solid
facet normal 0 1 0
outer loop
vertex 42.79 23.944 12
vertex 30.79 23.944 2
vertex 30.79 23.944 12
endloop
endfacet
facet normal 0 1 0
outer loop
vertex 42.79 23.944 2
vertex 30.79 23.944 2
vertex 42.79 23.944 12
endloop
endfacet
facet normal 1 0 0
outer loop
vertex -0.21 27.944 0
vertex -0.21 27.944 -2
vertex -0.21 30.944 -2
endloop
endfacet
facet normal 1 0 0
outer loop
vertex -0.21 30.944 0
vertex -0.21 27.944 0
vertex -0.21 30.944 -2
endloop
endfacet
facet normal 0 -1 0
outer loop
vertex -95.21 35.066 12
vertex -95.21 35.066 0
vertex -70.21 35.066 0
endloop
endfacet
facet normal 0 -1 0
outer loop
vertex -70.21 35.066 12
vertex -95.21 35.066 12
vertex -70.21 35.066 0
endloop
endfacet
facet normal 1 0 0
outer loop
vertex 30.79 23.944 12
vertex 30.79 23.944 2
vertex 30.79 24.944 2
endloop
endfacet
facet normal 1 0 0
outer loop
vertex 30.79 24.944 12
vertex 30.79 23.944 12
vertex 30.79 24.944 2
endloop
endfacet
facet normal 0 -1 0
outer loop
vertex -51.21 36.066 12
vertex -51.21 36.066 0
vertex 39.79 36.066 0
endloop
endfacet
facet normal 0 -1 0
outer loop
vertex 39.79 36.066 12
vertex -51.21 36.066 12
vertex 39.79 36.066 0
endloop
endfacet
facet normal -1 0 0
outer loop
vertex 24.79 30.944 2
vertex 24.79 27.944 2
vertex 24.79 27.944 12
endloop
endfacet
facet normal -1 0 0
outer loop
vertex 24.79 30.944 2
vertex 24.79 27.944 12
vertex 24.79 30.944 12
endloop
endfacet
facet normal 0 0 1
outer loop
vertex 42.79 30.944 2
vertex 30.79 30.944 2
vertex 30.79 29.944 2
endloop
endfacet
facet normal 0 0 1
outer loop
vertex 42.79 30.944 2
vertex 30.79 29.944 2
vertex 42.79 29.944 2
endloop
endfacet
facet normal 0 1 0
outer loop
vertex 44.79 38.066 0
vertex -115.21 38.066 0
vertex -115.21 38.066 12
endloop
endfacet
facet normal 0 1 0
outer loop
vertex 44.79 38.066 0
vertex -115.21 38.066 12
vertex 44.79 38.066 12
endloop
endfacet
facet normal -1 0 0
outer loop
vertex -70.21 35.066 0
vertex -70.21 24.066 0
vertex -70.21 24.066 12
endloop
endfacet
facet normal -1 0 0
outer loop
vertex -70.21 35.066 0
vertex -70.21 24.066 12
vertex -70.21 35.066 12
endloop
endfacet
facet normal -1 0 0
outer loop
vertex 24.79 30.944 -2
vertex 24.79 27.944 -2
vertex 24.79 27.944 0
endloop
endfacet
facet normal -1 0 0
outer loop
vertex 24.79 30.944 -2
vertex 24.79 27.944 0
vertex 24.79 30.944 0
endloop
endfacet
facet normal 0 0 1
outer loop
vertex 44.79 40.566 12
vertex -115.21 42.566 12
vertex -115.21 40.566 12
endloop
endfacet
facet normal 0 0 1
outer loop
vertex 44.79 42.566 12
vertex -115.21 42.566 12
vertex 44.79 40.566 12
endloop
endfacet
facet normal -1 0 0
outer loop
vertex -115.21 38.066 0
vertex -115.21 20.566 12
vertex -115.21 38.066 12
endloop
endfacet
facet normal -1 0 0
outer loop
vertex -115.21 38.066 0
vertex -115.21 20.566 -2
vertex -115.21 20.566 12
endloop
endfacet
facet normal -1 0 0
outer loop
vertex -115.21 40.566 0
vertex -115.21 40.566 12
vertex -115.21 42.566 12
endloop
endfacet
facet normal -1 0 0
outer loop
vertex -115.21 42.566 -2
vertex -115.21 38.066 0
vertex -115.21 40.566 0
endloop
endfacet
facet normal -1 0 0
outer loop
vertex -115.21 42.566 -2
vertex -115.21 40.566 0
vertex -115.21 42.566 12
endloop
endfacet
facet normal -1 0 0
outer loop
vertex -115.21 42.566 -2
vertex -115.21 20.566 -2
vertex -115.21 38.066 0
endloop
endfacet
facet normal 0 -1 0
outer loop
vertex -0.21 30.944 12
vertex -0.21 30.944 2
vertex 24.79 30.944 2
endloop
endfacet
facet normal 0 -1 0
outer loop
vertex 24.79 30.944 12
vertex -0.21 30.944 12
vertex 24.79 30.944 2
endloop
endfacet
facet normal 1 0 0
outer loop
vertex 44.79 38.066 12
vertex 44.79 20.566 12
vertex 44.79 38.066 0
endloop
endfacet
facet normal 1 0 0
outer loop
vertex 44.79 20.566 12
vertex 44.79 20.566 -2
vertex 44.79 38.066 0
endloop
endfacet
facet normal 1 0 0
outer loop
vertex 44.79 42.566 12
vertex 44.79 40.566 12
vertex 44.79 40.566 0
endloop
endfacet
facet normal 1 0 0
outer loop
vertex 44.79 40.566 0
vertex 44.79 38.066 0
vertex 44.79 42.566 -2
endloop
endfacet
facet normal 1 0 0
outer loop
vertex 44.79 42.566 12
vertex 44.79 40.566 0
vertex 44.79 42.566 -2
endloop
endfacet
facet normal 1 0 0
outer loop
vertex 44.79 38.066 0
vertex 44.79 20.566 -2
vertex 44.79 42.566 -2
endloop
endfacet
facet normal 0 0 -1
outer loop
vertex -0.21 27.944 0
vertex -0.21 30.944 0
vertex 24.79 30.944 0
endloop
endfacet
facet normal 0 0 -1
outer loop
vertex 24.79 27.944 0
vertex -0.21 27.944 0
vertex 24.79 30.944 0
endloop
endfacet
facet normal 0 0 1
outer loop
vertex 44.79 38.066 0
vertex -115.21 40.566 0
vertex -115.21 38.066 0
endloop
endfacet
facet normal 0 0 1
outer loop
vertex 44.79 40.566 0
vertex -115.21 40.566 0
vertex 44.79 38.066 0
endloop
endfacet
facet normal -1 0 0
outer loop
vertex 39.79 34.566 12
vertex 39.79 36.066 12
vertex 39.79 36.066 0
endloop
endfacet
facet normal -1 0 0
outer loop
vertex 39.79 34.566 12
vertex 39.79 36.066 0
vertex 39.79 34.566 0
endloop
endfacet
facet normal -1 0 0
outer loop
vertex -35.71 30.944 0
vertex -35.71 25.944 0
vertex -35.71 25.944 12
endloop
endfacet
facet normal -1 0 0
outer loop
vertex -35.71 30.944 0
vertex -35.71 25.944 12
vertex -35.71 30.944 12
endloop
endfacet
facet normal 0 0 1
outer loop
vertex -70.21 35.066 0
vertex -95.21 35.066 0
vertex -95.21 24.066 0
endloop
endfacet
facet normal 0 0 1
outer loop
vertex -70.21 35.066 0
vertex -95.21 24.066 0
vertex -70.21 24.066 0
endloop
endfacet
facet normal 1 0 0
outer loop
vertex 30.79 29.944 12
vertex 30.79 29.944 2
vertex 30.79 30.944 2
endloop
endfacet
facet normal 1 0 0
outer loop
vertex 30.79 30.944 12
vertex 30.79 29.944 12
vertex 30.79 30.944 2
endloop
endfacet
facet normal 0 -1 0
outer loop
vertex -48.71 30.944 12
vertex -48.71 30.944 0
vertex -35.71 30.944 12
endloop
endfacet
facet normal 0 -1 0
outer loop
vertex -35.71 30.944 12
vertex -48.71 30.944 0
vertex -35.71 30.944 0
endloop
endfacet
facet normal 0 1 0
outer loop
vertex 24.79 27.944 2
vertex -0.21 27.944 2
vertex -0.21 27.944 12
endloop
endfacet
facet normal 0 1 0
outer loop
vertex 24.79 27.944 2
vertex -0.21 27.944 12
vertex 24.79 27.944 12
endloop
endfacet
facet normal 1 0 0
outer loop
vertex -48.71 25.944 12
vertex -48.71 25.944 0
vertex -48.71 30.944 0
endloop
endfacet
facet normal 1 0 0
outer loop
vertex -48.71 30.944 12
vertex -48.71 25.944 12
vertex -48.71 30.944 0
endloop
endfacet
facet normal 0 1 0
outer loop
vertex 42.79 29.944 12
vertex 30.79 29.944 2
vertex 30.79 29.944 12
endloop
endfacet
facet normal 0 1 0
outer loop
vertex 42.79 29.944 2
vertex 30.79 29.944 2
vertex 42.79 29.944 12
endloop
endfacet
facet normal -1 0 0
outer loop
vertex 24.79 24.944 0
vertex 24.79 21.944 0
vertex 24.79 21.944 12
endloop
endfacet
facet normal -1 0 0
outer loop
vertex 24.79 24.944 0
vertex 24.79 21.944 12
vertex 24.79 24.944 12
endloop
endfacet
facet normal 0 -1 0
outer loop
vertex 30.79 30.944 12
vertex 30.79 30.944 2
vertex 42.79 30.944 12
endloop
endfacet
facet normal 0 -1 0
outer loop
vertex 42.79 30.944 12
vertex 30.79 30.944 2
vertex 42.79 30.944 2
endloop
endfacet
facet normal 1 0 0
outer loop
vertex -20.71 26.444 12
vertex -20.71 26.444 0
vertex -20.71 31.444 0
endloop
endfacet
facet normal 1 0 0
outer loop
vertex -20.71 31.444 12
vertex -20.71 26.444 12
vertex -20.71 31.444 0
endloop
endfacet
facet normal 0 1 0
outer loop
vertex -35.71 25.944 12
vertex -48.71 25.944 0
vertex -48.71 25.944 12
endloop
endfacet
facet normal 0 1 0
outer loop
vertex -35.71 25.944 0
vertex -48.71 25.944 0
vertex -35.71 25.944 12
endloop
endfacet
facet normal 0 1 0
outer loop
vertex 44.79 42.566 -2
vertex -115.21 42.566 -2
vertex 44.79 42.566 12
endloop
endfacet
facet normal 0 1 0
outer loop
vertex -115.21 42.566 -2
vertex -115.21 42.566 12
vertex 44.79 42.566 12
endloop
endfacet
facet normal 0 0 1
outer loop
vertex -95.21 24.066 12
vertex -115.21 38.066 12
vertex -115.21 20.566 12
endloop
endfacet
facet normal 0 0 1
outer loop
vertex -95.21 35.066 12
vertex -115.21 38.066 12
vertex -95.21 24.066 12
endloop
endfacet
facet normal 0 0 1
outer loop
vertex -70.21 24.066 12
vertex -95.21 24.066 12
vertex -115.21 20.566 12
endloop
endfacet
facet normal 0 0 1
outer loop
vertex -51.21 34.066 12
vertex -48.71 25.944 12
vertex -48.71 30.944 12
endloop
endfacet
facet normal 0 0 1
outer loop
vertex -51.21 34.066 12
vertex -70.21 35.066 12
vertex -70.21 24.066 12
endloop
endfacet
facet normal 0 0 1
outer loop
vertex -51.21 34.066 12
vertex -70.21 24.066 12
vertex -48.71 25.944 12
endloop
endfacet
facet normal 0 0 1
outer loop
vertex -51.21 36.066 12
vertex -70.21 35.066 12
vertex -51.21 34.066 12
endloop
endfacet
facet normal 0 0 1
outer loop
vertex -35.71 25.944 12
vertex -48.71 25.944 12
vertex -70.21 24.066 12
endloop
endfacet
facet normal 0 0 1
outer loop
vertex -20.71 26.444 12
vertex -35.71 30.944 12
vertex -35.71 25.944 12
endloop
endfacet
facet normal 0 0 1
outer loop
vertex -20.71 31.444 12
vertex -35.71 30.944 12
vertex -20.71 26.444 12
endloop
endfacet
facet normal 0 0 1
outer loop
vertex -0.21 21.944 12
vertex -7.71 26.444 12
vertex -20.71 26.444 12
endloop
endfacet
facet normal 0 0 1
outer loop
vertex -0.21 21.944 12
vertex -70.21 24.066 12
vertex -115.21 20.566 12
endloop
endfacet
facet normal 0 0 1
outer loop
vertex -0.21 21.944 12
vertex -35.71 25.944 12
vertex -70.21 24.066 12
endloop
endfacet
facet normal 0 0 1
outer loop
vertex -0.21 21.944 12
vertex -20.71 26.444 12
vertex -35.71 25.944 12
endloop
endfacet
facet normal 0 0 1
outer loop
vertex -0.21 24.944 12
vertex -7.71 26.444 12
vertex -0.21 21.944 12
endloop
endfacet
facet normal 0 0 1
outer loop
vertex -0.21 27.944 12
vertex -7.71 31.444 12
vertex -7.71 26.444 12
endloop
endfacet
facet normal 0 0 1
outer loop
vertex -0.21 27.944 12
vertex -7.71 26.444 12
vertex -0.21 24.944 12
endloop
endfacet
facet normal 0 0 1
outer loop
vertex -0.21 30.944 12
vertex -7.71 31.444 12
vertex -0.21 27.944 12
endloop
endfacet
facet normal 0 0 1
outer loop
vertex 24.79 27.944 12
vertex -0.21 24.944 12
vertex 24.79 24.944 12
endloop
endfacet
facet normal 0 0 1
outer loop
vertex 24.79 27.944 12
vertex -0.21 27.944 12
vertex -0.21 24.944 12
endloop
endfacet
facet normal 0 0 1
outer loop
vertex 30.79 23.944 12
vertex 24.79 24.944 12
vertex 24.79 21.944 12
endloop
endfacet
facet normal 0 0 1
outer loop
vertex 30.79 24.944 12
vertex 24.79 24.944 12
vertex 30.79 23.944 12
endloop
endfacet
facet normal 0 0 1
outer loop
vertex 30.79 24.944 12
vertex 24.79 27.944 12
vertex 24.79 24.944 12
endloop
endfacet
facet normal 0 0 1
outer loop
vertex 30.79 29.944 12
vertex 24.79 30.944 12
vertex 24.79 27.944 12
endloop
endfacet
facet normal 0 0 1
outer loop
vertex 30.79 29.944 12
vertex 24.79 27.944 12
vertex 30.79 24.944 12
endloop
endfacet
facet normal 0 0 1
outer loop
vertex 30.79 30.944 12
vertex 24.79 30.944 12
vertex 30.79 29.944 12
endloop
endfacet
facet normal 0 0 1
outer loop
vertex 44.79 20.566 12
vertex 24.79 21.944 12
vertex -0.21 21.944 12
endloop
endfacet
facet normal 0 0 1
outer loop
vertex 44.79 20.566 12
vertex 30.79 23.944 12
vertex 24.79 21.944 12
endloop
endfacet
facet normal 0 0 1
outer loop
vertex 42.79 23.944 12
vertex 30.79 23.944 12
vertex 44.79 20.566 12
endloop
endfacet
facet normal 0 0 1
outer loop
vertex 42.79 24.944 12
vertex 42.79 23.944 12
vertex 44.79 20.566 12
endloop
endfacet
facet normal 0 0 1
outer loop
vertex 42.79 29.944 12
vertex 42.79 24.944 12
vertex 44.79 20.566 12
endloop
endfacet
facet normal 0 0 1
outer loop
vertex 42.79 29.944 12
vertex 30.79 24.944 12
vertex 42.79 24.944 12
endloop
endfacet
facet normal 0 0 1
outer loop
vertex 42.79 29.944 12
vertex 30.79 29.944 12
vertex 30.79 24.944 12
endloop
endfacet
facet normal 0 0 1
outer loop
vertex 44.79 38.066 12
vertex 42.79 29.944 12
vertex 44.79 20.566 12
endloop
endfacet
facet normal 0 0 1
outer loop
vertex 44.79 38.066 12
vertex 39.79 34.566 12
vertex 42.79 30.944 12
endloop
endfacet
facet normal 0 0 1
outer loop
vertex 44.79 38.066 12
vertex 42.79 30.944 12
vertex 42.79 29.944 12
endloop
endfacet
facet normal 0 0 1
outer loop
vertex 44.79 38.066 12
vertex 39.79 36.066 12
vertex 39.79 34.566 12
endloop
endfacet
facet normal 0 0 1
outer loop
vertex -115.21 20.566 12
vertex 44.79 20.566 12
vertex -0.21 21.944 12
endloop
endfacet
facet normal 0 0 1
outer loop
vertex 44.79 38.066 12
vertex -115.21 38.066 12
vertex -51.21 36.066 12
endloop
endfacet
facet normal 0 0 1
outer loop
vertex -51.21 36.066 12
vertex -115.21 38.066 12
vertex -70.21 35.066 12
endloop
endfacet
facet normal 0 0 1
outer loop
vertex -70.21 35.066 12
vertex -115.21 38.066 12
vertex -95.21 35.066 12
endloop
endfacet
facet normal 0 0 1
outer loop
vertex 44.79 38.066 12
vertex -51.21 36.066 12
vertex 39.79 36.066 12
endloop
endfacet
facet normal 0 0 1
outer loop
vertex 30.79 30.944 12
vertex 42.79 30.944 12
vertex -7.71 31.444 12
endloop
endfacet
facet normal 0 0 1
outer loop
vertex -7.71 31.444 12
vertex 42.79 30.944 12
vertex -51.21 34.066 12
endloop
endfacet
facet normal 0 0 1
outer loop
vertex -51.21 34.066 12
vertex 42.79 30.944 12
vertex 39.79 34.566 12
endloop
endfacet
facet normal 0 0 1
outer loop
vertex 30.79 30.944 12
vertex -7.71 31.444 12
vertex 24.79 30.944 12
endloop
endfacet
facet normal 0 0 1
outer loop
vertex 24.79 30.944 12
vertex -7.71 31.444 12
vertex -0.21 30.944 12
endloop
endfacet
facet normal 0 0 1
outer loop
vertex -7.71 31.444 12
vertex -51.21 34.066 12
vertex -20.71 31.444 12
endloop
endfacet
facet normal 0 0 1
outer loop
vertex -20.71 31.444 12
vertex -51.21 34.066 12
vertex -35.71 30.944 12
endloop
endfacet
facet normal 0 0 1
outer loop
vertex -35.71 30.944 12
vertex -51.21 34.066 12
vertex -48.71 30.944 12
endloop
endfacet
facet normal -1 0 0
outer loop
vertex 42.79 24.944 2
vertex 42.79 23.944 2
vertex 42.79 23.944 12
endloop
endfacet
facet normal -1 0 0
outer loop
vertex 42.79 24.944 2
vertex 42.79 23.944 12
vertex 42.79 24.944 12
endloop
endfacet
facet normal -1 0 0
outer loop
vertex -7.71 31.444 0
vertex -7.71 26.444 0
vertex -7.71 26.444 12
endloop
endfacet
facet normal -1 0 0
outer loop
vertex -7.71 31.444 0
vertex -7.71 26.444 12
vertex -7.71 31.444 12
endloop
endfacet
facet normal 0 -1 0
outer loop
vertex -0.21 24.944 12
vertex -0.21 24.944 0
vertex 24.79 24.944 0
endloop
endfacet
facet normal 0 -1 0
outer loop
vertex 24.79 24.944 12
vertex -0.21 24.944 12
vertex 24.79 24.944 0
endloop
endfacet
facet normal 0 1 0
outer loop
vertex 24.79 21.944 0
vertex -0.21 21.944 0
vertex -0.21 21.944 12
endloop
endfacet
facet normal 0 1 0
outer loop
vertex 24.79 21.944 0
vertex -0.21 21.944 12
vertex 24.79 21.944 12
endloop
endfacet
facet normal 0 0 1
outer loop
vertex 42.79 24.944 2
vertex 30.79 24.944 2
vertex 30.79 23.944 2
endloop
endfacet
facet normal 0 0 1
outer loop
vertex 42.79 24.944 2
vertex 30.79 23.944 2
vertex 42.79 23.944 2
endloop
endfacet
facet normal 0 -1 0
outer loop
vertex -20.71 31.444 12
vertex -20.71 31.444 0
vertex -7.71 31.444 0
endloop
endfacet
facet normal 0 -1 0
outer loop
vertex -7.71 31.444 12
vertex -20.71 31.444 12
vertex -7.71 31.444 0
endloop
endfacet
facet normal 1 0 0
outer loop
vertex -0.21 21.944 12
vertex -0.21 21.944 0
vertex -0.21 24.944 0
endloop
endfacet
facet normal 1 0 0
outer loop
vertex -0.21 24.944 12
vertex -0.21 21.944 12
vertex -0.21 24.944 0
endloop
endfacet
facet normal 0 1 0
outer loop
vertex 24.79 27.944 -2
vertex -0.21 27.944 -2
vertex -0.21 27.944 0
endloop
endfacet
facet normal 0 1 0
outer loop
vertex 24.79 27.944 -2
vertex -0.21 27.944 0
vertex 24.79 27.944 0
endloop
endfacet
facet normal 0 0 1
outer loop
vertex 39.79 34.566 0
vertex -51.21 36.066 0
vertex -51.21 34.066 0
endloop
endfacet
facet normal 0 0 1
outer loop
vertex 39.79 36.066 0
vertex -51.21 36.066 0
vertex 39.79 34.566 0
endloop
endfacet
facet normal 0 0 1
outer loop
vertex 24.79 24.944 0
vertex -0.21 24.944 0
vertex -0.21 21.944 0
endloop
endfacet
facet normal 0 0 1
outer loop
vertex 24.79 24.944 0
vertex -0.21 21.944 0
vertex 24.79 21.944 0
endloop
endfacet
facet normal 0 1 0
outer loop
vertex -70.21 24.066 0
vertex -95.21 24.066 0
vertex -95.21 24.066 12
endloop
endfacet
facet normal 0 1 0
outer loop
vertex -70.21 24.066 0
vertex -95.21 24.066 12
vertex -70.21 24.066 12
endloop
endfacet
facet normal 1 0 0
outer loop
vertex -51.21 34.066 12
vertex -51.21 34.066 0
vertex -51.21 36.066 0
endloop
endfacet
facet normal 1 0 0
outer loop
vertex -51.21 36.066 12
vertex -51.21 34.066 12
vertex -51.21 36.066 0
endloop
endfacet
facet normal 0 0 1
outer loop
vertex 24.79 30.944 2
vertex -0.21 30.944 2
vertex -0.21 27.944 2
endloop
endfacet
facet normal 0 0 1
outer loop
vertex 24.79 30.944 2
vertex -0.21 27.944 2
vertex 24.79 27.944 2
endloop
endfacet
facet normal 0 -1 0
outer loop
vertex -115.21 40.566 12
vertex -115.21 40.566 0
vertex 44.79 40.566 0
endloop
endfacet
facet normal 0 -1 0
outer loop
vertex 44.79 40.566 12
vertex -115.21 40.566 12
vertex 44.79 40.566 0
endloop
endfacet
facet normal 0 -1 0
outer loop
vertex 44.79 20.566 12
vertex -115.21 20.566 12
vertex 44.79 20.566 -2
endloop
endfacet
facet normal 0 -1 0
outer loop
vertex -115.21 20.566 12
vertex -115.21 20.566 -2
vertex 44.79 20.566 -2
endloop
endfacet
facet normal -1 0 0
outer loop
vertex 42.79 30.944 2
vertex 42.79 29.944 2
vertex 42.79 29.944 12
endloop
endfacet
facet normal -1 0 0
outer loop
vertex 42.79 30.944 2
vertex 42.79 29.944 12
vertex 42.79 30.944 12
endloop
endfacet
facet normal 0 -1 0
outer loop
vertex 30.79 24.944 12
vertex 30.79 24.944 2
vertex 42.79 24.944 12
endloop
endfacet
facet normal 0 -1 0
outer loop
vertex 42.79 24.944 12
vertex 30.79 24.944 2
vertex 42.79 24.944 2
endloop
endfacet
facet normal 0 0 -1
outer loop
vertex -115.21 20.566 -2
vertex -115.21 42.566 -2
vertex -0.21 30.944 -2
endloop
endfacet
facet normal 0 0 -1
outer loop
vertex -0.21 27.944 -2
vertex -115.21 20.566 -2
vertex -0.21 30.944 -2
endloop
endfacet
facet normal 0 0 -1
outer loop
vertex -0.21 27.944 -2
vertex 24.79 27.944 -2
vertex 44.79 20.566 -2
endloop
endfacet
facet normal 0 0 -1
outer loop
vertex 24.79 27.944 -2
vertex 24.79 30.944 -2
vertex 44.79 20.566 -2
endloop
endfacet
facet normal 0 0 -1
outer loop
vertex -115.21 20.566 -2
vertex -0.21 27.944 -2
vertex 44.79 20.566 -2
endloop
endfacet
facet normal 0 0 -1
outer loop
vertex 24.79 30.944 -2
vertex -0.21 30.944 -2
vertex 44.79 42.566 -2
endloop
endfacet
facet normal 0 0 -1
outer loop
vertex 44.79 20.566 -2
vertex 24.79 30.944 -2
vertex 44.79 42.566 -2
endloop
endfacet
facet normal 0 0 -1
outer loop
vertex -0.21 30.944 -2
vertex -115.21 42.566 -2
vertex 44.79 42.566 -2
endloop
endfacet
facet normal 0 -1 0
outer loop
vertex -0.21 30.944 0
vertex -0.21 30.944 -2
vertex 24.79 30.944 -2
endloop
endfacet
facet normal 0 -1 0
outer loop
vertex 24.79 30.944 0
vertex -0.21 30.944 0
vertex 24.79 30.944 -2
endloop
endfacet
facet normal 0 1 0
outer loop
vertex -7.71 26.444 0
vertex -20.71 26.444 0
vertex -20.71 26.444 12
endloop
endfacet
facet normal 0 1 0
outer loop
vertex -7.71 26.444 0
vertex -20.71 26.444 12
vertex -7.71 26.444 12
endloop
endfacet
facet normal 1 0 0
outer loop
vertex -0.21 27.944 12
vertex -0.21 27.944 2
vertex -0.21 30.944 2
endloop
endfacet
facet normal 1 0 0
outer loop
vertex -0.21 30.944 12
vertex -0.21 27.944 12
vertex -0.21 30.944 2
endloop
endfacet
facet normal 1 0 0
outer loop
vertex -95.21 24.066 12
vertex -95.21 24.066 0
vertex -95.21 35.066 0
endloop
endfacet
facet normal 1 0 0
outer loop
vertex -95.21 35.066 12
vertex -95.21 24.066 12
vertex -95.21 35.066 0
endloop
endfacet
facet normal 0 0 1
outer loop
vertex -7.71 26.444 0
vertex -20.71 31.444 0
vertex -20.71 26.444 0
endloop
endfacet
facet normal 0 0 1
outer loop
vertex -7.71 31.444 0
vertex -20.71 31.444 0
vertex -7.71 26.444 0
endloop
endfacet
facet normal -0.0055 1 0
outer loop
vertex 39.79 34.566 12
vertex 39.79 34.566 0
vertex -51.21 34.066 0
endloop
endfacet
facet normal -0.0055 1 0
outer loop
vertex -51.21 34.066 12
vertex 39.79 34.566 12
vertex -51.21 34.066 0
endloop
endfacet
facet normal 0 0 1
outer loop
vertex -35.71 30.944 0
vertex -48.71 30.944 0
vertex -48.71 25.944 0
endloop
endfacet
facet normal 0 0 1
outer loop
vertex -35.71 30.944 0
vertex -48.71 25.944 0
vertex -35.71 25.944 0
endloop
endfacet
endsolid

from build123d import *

# Parameters (mm, degrees)
F0_W     = 160
F0_H     = 17.5
F0_W_2   = 25
F0_H_2   = 11
F0_W_3   = 13
F0_H_3   = 5
F0_H_4   = 3
F0_W_4   = 12
F0_H_5   = 1
F0_H_6   = 2.5
F0_H_7   = 2
F1_DEPTH = 2
F2_DEPTH = 12
F3_DEPTH = 2
F4_DEPTH = 2


# Not quite as in the source:
# - a feature names something its author has since deleted; it is built from what else it names


with BuildPart() as f1:
    # F0 (on Top) → F1 (new body)
    with BuildSketch(Plane.XY):
        with Locations((-35.2099549949, 29.3164705649)):
            Rectangle(F0_W, F0_H)
        with Locations((-82.7099549949, 29.5664705649)):
            Rectangle(F0_W_2, F0_H_2, mode=Mode.SUBTRACT)
        with Locations((-42.2099549949, 28.443671599)):
            Rectangle(F0_W_3, F0_H_3, mode=Mode.SUBTRACT)
        with Locations((12.2900450051, 23.443671599)):
            Rectangle(F0_W_2, F0_H_4, mode=Mode.SUBTRACT)
        with Locations((36.7900450051, 24.443671599)):
            Rectangle(F0_W_4, F0_H_5, mode=Mode.SUBTRACT)
        with Locations((-14.2099549949, 28.943671599)):
            Rectangle(F0_W_3, F0_H_3, mode=Mode.SUBTRACT)
        with Locations((12.2900450051, 29.443671599)):
            Rectangle(F0_W_2, F0_H_4, mode=Mode.SUBTRACT)
        with Locations((36.7900450051, 30.443671599)):
            Rectangle(F0_W_4, F0_H_5, mode=Mode.SUBTRACT)
        Polygon((-51.2099549949, 36.0664705649), (39.7900450051, 36.0664705649), (39.7900450051, 34.5664705649), (-51.2099549949, 34.0664705649), align=None, mode=Mode.SUBTRACT)
        with Locations((-35.2099549949, 39.3164705649)):
            Rectangle(F0_W, F0_H_6)
        with Locations((-35.2099549949, 41.5664705649)):
            Rectangle(F0_W, F0_H_7)
        with Locations((-82.7099549949, 29.5664705649)):
            Rectangle(F0_W_2, F0_H_2)
        Polygon((39.7900450051, 34.5664705649), (39.7900450051, 36.0664705649), (-51.2099549949, 36.0664705649), (-51.2099549949, 34.0664705649), align=None)
        with Locations((12.2900450051, 23.443671599)):
            Rectangle(F0_W_2, F0_H_4)
        with Locations((-42.2099549949, 28.443671599)):
            Rectangle(F0_W_3, F0_H_3)
        with Locations((-14.2099549949, 28.943671599)):
            Rectangle(F0_W_3, F0_H_3)
        with Locations((36.7900450051, 24.443671599)):
            Rectangle(F0_W_4, F0_H_5)
        with Locations((36.7900450051, 30.443671599)):
            Rectangle(F0_W_4, F0_H_5)
    extrude(amount=-F1_DEPTH)

    # F0 (on Top) → F2 (join)
    with BuildSketch(Plane.XY):
        with Locations((-35.2099549949, 29.3164705649)):
            Rectangle(F0_W, F0_H)
        with Locations((-82.7099549949, 29.5664705649)):
            Rectangle(F0_W_2, F0_H_2, mode=Mode.SUBTRACT)
        with Locations((-42.2099549949, 28.443671599)):
            Rectangle(F0_W_3, F0_H_3, mode=Mode.SUBTRACT)
        with Locations((12.2900450051, 23.443671599)):
            Rectangle(F0_W_2, F0_H_4, mode=Mode.SUBTRACT)
        with Locations((36.7900450051, 24.443671599)):
            Rectangle(F0_W_4, F0_H_5, mode=Mode.SUBTRACT)
        with Locations((-14.2099549949, 28.943671599)):
            Rectangle(F0_W_3, F0_H_3, mode=Mode.SUBTRACT)
        with Locations((12.2900450051, 29.443671599)):
            Rectangle(F0_W_2, F0_H_4, mode=Mode.SUBTRACT)
        with Locations((36.7900450051, 30.443671599)):
            Rectangle(F0_W_4, F0_H_5, mode=Mode.SUBTRACT)
        Polygon((-51.2099549949, 36.0664705649), (39.7900450051, 36.0664705649), (39.7900450051, 34.5664705649), (-51.2099549949, 34.0664705649), align=None, mode=Mode.SUBTRACT)
        with Locations((-35.2099549949, 41.5664705649)):
            Rectangle(F0_W, F0_H_7)
    extrude(amount=F2_DEPTH)

    # F0 (on Top) → F3 (join)
    with BuildSketch(Plane.XY):
        with Locations((36.7900450051, 30.443671599)):
            Rectangle(F0_W_4, F0_H_5)
        with Locations((36.7900450051, 24.443671599)):
            Rectangle(F0_W_4, F0_H_5)
    extrude(amount=F3_DEPTH)

    # F0 (on Top) → F4 (join)
    with BuildSketch(Plane.XY):
        with Locations((12.2900450051, 29.443671599)):
            Rectangle(F0_W_2, F0_H_4)
    extrude(amount=F4_DEPTH)


solid = f1.part
